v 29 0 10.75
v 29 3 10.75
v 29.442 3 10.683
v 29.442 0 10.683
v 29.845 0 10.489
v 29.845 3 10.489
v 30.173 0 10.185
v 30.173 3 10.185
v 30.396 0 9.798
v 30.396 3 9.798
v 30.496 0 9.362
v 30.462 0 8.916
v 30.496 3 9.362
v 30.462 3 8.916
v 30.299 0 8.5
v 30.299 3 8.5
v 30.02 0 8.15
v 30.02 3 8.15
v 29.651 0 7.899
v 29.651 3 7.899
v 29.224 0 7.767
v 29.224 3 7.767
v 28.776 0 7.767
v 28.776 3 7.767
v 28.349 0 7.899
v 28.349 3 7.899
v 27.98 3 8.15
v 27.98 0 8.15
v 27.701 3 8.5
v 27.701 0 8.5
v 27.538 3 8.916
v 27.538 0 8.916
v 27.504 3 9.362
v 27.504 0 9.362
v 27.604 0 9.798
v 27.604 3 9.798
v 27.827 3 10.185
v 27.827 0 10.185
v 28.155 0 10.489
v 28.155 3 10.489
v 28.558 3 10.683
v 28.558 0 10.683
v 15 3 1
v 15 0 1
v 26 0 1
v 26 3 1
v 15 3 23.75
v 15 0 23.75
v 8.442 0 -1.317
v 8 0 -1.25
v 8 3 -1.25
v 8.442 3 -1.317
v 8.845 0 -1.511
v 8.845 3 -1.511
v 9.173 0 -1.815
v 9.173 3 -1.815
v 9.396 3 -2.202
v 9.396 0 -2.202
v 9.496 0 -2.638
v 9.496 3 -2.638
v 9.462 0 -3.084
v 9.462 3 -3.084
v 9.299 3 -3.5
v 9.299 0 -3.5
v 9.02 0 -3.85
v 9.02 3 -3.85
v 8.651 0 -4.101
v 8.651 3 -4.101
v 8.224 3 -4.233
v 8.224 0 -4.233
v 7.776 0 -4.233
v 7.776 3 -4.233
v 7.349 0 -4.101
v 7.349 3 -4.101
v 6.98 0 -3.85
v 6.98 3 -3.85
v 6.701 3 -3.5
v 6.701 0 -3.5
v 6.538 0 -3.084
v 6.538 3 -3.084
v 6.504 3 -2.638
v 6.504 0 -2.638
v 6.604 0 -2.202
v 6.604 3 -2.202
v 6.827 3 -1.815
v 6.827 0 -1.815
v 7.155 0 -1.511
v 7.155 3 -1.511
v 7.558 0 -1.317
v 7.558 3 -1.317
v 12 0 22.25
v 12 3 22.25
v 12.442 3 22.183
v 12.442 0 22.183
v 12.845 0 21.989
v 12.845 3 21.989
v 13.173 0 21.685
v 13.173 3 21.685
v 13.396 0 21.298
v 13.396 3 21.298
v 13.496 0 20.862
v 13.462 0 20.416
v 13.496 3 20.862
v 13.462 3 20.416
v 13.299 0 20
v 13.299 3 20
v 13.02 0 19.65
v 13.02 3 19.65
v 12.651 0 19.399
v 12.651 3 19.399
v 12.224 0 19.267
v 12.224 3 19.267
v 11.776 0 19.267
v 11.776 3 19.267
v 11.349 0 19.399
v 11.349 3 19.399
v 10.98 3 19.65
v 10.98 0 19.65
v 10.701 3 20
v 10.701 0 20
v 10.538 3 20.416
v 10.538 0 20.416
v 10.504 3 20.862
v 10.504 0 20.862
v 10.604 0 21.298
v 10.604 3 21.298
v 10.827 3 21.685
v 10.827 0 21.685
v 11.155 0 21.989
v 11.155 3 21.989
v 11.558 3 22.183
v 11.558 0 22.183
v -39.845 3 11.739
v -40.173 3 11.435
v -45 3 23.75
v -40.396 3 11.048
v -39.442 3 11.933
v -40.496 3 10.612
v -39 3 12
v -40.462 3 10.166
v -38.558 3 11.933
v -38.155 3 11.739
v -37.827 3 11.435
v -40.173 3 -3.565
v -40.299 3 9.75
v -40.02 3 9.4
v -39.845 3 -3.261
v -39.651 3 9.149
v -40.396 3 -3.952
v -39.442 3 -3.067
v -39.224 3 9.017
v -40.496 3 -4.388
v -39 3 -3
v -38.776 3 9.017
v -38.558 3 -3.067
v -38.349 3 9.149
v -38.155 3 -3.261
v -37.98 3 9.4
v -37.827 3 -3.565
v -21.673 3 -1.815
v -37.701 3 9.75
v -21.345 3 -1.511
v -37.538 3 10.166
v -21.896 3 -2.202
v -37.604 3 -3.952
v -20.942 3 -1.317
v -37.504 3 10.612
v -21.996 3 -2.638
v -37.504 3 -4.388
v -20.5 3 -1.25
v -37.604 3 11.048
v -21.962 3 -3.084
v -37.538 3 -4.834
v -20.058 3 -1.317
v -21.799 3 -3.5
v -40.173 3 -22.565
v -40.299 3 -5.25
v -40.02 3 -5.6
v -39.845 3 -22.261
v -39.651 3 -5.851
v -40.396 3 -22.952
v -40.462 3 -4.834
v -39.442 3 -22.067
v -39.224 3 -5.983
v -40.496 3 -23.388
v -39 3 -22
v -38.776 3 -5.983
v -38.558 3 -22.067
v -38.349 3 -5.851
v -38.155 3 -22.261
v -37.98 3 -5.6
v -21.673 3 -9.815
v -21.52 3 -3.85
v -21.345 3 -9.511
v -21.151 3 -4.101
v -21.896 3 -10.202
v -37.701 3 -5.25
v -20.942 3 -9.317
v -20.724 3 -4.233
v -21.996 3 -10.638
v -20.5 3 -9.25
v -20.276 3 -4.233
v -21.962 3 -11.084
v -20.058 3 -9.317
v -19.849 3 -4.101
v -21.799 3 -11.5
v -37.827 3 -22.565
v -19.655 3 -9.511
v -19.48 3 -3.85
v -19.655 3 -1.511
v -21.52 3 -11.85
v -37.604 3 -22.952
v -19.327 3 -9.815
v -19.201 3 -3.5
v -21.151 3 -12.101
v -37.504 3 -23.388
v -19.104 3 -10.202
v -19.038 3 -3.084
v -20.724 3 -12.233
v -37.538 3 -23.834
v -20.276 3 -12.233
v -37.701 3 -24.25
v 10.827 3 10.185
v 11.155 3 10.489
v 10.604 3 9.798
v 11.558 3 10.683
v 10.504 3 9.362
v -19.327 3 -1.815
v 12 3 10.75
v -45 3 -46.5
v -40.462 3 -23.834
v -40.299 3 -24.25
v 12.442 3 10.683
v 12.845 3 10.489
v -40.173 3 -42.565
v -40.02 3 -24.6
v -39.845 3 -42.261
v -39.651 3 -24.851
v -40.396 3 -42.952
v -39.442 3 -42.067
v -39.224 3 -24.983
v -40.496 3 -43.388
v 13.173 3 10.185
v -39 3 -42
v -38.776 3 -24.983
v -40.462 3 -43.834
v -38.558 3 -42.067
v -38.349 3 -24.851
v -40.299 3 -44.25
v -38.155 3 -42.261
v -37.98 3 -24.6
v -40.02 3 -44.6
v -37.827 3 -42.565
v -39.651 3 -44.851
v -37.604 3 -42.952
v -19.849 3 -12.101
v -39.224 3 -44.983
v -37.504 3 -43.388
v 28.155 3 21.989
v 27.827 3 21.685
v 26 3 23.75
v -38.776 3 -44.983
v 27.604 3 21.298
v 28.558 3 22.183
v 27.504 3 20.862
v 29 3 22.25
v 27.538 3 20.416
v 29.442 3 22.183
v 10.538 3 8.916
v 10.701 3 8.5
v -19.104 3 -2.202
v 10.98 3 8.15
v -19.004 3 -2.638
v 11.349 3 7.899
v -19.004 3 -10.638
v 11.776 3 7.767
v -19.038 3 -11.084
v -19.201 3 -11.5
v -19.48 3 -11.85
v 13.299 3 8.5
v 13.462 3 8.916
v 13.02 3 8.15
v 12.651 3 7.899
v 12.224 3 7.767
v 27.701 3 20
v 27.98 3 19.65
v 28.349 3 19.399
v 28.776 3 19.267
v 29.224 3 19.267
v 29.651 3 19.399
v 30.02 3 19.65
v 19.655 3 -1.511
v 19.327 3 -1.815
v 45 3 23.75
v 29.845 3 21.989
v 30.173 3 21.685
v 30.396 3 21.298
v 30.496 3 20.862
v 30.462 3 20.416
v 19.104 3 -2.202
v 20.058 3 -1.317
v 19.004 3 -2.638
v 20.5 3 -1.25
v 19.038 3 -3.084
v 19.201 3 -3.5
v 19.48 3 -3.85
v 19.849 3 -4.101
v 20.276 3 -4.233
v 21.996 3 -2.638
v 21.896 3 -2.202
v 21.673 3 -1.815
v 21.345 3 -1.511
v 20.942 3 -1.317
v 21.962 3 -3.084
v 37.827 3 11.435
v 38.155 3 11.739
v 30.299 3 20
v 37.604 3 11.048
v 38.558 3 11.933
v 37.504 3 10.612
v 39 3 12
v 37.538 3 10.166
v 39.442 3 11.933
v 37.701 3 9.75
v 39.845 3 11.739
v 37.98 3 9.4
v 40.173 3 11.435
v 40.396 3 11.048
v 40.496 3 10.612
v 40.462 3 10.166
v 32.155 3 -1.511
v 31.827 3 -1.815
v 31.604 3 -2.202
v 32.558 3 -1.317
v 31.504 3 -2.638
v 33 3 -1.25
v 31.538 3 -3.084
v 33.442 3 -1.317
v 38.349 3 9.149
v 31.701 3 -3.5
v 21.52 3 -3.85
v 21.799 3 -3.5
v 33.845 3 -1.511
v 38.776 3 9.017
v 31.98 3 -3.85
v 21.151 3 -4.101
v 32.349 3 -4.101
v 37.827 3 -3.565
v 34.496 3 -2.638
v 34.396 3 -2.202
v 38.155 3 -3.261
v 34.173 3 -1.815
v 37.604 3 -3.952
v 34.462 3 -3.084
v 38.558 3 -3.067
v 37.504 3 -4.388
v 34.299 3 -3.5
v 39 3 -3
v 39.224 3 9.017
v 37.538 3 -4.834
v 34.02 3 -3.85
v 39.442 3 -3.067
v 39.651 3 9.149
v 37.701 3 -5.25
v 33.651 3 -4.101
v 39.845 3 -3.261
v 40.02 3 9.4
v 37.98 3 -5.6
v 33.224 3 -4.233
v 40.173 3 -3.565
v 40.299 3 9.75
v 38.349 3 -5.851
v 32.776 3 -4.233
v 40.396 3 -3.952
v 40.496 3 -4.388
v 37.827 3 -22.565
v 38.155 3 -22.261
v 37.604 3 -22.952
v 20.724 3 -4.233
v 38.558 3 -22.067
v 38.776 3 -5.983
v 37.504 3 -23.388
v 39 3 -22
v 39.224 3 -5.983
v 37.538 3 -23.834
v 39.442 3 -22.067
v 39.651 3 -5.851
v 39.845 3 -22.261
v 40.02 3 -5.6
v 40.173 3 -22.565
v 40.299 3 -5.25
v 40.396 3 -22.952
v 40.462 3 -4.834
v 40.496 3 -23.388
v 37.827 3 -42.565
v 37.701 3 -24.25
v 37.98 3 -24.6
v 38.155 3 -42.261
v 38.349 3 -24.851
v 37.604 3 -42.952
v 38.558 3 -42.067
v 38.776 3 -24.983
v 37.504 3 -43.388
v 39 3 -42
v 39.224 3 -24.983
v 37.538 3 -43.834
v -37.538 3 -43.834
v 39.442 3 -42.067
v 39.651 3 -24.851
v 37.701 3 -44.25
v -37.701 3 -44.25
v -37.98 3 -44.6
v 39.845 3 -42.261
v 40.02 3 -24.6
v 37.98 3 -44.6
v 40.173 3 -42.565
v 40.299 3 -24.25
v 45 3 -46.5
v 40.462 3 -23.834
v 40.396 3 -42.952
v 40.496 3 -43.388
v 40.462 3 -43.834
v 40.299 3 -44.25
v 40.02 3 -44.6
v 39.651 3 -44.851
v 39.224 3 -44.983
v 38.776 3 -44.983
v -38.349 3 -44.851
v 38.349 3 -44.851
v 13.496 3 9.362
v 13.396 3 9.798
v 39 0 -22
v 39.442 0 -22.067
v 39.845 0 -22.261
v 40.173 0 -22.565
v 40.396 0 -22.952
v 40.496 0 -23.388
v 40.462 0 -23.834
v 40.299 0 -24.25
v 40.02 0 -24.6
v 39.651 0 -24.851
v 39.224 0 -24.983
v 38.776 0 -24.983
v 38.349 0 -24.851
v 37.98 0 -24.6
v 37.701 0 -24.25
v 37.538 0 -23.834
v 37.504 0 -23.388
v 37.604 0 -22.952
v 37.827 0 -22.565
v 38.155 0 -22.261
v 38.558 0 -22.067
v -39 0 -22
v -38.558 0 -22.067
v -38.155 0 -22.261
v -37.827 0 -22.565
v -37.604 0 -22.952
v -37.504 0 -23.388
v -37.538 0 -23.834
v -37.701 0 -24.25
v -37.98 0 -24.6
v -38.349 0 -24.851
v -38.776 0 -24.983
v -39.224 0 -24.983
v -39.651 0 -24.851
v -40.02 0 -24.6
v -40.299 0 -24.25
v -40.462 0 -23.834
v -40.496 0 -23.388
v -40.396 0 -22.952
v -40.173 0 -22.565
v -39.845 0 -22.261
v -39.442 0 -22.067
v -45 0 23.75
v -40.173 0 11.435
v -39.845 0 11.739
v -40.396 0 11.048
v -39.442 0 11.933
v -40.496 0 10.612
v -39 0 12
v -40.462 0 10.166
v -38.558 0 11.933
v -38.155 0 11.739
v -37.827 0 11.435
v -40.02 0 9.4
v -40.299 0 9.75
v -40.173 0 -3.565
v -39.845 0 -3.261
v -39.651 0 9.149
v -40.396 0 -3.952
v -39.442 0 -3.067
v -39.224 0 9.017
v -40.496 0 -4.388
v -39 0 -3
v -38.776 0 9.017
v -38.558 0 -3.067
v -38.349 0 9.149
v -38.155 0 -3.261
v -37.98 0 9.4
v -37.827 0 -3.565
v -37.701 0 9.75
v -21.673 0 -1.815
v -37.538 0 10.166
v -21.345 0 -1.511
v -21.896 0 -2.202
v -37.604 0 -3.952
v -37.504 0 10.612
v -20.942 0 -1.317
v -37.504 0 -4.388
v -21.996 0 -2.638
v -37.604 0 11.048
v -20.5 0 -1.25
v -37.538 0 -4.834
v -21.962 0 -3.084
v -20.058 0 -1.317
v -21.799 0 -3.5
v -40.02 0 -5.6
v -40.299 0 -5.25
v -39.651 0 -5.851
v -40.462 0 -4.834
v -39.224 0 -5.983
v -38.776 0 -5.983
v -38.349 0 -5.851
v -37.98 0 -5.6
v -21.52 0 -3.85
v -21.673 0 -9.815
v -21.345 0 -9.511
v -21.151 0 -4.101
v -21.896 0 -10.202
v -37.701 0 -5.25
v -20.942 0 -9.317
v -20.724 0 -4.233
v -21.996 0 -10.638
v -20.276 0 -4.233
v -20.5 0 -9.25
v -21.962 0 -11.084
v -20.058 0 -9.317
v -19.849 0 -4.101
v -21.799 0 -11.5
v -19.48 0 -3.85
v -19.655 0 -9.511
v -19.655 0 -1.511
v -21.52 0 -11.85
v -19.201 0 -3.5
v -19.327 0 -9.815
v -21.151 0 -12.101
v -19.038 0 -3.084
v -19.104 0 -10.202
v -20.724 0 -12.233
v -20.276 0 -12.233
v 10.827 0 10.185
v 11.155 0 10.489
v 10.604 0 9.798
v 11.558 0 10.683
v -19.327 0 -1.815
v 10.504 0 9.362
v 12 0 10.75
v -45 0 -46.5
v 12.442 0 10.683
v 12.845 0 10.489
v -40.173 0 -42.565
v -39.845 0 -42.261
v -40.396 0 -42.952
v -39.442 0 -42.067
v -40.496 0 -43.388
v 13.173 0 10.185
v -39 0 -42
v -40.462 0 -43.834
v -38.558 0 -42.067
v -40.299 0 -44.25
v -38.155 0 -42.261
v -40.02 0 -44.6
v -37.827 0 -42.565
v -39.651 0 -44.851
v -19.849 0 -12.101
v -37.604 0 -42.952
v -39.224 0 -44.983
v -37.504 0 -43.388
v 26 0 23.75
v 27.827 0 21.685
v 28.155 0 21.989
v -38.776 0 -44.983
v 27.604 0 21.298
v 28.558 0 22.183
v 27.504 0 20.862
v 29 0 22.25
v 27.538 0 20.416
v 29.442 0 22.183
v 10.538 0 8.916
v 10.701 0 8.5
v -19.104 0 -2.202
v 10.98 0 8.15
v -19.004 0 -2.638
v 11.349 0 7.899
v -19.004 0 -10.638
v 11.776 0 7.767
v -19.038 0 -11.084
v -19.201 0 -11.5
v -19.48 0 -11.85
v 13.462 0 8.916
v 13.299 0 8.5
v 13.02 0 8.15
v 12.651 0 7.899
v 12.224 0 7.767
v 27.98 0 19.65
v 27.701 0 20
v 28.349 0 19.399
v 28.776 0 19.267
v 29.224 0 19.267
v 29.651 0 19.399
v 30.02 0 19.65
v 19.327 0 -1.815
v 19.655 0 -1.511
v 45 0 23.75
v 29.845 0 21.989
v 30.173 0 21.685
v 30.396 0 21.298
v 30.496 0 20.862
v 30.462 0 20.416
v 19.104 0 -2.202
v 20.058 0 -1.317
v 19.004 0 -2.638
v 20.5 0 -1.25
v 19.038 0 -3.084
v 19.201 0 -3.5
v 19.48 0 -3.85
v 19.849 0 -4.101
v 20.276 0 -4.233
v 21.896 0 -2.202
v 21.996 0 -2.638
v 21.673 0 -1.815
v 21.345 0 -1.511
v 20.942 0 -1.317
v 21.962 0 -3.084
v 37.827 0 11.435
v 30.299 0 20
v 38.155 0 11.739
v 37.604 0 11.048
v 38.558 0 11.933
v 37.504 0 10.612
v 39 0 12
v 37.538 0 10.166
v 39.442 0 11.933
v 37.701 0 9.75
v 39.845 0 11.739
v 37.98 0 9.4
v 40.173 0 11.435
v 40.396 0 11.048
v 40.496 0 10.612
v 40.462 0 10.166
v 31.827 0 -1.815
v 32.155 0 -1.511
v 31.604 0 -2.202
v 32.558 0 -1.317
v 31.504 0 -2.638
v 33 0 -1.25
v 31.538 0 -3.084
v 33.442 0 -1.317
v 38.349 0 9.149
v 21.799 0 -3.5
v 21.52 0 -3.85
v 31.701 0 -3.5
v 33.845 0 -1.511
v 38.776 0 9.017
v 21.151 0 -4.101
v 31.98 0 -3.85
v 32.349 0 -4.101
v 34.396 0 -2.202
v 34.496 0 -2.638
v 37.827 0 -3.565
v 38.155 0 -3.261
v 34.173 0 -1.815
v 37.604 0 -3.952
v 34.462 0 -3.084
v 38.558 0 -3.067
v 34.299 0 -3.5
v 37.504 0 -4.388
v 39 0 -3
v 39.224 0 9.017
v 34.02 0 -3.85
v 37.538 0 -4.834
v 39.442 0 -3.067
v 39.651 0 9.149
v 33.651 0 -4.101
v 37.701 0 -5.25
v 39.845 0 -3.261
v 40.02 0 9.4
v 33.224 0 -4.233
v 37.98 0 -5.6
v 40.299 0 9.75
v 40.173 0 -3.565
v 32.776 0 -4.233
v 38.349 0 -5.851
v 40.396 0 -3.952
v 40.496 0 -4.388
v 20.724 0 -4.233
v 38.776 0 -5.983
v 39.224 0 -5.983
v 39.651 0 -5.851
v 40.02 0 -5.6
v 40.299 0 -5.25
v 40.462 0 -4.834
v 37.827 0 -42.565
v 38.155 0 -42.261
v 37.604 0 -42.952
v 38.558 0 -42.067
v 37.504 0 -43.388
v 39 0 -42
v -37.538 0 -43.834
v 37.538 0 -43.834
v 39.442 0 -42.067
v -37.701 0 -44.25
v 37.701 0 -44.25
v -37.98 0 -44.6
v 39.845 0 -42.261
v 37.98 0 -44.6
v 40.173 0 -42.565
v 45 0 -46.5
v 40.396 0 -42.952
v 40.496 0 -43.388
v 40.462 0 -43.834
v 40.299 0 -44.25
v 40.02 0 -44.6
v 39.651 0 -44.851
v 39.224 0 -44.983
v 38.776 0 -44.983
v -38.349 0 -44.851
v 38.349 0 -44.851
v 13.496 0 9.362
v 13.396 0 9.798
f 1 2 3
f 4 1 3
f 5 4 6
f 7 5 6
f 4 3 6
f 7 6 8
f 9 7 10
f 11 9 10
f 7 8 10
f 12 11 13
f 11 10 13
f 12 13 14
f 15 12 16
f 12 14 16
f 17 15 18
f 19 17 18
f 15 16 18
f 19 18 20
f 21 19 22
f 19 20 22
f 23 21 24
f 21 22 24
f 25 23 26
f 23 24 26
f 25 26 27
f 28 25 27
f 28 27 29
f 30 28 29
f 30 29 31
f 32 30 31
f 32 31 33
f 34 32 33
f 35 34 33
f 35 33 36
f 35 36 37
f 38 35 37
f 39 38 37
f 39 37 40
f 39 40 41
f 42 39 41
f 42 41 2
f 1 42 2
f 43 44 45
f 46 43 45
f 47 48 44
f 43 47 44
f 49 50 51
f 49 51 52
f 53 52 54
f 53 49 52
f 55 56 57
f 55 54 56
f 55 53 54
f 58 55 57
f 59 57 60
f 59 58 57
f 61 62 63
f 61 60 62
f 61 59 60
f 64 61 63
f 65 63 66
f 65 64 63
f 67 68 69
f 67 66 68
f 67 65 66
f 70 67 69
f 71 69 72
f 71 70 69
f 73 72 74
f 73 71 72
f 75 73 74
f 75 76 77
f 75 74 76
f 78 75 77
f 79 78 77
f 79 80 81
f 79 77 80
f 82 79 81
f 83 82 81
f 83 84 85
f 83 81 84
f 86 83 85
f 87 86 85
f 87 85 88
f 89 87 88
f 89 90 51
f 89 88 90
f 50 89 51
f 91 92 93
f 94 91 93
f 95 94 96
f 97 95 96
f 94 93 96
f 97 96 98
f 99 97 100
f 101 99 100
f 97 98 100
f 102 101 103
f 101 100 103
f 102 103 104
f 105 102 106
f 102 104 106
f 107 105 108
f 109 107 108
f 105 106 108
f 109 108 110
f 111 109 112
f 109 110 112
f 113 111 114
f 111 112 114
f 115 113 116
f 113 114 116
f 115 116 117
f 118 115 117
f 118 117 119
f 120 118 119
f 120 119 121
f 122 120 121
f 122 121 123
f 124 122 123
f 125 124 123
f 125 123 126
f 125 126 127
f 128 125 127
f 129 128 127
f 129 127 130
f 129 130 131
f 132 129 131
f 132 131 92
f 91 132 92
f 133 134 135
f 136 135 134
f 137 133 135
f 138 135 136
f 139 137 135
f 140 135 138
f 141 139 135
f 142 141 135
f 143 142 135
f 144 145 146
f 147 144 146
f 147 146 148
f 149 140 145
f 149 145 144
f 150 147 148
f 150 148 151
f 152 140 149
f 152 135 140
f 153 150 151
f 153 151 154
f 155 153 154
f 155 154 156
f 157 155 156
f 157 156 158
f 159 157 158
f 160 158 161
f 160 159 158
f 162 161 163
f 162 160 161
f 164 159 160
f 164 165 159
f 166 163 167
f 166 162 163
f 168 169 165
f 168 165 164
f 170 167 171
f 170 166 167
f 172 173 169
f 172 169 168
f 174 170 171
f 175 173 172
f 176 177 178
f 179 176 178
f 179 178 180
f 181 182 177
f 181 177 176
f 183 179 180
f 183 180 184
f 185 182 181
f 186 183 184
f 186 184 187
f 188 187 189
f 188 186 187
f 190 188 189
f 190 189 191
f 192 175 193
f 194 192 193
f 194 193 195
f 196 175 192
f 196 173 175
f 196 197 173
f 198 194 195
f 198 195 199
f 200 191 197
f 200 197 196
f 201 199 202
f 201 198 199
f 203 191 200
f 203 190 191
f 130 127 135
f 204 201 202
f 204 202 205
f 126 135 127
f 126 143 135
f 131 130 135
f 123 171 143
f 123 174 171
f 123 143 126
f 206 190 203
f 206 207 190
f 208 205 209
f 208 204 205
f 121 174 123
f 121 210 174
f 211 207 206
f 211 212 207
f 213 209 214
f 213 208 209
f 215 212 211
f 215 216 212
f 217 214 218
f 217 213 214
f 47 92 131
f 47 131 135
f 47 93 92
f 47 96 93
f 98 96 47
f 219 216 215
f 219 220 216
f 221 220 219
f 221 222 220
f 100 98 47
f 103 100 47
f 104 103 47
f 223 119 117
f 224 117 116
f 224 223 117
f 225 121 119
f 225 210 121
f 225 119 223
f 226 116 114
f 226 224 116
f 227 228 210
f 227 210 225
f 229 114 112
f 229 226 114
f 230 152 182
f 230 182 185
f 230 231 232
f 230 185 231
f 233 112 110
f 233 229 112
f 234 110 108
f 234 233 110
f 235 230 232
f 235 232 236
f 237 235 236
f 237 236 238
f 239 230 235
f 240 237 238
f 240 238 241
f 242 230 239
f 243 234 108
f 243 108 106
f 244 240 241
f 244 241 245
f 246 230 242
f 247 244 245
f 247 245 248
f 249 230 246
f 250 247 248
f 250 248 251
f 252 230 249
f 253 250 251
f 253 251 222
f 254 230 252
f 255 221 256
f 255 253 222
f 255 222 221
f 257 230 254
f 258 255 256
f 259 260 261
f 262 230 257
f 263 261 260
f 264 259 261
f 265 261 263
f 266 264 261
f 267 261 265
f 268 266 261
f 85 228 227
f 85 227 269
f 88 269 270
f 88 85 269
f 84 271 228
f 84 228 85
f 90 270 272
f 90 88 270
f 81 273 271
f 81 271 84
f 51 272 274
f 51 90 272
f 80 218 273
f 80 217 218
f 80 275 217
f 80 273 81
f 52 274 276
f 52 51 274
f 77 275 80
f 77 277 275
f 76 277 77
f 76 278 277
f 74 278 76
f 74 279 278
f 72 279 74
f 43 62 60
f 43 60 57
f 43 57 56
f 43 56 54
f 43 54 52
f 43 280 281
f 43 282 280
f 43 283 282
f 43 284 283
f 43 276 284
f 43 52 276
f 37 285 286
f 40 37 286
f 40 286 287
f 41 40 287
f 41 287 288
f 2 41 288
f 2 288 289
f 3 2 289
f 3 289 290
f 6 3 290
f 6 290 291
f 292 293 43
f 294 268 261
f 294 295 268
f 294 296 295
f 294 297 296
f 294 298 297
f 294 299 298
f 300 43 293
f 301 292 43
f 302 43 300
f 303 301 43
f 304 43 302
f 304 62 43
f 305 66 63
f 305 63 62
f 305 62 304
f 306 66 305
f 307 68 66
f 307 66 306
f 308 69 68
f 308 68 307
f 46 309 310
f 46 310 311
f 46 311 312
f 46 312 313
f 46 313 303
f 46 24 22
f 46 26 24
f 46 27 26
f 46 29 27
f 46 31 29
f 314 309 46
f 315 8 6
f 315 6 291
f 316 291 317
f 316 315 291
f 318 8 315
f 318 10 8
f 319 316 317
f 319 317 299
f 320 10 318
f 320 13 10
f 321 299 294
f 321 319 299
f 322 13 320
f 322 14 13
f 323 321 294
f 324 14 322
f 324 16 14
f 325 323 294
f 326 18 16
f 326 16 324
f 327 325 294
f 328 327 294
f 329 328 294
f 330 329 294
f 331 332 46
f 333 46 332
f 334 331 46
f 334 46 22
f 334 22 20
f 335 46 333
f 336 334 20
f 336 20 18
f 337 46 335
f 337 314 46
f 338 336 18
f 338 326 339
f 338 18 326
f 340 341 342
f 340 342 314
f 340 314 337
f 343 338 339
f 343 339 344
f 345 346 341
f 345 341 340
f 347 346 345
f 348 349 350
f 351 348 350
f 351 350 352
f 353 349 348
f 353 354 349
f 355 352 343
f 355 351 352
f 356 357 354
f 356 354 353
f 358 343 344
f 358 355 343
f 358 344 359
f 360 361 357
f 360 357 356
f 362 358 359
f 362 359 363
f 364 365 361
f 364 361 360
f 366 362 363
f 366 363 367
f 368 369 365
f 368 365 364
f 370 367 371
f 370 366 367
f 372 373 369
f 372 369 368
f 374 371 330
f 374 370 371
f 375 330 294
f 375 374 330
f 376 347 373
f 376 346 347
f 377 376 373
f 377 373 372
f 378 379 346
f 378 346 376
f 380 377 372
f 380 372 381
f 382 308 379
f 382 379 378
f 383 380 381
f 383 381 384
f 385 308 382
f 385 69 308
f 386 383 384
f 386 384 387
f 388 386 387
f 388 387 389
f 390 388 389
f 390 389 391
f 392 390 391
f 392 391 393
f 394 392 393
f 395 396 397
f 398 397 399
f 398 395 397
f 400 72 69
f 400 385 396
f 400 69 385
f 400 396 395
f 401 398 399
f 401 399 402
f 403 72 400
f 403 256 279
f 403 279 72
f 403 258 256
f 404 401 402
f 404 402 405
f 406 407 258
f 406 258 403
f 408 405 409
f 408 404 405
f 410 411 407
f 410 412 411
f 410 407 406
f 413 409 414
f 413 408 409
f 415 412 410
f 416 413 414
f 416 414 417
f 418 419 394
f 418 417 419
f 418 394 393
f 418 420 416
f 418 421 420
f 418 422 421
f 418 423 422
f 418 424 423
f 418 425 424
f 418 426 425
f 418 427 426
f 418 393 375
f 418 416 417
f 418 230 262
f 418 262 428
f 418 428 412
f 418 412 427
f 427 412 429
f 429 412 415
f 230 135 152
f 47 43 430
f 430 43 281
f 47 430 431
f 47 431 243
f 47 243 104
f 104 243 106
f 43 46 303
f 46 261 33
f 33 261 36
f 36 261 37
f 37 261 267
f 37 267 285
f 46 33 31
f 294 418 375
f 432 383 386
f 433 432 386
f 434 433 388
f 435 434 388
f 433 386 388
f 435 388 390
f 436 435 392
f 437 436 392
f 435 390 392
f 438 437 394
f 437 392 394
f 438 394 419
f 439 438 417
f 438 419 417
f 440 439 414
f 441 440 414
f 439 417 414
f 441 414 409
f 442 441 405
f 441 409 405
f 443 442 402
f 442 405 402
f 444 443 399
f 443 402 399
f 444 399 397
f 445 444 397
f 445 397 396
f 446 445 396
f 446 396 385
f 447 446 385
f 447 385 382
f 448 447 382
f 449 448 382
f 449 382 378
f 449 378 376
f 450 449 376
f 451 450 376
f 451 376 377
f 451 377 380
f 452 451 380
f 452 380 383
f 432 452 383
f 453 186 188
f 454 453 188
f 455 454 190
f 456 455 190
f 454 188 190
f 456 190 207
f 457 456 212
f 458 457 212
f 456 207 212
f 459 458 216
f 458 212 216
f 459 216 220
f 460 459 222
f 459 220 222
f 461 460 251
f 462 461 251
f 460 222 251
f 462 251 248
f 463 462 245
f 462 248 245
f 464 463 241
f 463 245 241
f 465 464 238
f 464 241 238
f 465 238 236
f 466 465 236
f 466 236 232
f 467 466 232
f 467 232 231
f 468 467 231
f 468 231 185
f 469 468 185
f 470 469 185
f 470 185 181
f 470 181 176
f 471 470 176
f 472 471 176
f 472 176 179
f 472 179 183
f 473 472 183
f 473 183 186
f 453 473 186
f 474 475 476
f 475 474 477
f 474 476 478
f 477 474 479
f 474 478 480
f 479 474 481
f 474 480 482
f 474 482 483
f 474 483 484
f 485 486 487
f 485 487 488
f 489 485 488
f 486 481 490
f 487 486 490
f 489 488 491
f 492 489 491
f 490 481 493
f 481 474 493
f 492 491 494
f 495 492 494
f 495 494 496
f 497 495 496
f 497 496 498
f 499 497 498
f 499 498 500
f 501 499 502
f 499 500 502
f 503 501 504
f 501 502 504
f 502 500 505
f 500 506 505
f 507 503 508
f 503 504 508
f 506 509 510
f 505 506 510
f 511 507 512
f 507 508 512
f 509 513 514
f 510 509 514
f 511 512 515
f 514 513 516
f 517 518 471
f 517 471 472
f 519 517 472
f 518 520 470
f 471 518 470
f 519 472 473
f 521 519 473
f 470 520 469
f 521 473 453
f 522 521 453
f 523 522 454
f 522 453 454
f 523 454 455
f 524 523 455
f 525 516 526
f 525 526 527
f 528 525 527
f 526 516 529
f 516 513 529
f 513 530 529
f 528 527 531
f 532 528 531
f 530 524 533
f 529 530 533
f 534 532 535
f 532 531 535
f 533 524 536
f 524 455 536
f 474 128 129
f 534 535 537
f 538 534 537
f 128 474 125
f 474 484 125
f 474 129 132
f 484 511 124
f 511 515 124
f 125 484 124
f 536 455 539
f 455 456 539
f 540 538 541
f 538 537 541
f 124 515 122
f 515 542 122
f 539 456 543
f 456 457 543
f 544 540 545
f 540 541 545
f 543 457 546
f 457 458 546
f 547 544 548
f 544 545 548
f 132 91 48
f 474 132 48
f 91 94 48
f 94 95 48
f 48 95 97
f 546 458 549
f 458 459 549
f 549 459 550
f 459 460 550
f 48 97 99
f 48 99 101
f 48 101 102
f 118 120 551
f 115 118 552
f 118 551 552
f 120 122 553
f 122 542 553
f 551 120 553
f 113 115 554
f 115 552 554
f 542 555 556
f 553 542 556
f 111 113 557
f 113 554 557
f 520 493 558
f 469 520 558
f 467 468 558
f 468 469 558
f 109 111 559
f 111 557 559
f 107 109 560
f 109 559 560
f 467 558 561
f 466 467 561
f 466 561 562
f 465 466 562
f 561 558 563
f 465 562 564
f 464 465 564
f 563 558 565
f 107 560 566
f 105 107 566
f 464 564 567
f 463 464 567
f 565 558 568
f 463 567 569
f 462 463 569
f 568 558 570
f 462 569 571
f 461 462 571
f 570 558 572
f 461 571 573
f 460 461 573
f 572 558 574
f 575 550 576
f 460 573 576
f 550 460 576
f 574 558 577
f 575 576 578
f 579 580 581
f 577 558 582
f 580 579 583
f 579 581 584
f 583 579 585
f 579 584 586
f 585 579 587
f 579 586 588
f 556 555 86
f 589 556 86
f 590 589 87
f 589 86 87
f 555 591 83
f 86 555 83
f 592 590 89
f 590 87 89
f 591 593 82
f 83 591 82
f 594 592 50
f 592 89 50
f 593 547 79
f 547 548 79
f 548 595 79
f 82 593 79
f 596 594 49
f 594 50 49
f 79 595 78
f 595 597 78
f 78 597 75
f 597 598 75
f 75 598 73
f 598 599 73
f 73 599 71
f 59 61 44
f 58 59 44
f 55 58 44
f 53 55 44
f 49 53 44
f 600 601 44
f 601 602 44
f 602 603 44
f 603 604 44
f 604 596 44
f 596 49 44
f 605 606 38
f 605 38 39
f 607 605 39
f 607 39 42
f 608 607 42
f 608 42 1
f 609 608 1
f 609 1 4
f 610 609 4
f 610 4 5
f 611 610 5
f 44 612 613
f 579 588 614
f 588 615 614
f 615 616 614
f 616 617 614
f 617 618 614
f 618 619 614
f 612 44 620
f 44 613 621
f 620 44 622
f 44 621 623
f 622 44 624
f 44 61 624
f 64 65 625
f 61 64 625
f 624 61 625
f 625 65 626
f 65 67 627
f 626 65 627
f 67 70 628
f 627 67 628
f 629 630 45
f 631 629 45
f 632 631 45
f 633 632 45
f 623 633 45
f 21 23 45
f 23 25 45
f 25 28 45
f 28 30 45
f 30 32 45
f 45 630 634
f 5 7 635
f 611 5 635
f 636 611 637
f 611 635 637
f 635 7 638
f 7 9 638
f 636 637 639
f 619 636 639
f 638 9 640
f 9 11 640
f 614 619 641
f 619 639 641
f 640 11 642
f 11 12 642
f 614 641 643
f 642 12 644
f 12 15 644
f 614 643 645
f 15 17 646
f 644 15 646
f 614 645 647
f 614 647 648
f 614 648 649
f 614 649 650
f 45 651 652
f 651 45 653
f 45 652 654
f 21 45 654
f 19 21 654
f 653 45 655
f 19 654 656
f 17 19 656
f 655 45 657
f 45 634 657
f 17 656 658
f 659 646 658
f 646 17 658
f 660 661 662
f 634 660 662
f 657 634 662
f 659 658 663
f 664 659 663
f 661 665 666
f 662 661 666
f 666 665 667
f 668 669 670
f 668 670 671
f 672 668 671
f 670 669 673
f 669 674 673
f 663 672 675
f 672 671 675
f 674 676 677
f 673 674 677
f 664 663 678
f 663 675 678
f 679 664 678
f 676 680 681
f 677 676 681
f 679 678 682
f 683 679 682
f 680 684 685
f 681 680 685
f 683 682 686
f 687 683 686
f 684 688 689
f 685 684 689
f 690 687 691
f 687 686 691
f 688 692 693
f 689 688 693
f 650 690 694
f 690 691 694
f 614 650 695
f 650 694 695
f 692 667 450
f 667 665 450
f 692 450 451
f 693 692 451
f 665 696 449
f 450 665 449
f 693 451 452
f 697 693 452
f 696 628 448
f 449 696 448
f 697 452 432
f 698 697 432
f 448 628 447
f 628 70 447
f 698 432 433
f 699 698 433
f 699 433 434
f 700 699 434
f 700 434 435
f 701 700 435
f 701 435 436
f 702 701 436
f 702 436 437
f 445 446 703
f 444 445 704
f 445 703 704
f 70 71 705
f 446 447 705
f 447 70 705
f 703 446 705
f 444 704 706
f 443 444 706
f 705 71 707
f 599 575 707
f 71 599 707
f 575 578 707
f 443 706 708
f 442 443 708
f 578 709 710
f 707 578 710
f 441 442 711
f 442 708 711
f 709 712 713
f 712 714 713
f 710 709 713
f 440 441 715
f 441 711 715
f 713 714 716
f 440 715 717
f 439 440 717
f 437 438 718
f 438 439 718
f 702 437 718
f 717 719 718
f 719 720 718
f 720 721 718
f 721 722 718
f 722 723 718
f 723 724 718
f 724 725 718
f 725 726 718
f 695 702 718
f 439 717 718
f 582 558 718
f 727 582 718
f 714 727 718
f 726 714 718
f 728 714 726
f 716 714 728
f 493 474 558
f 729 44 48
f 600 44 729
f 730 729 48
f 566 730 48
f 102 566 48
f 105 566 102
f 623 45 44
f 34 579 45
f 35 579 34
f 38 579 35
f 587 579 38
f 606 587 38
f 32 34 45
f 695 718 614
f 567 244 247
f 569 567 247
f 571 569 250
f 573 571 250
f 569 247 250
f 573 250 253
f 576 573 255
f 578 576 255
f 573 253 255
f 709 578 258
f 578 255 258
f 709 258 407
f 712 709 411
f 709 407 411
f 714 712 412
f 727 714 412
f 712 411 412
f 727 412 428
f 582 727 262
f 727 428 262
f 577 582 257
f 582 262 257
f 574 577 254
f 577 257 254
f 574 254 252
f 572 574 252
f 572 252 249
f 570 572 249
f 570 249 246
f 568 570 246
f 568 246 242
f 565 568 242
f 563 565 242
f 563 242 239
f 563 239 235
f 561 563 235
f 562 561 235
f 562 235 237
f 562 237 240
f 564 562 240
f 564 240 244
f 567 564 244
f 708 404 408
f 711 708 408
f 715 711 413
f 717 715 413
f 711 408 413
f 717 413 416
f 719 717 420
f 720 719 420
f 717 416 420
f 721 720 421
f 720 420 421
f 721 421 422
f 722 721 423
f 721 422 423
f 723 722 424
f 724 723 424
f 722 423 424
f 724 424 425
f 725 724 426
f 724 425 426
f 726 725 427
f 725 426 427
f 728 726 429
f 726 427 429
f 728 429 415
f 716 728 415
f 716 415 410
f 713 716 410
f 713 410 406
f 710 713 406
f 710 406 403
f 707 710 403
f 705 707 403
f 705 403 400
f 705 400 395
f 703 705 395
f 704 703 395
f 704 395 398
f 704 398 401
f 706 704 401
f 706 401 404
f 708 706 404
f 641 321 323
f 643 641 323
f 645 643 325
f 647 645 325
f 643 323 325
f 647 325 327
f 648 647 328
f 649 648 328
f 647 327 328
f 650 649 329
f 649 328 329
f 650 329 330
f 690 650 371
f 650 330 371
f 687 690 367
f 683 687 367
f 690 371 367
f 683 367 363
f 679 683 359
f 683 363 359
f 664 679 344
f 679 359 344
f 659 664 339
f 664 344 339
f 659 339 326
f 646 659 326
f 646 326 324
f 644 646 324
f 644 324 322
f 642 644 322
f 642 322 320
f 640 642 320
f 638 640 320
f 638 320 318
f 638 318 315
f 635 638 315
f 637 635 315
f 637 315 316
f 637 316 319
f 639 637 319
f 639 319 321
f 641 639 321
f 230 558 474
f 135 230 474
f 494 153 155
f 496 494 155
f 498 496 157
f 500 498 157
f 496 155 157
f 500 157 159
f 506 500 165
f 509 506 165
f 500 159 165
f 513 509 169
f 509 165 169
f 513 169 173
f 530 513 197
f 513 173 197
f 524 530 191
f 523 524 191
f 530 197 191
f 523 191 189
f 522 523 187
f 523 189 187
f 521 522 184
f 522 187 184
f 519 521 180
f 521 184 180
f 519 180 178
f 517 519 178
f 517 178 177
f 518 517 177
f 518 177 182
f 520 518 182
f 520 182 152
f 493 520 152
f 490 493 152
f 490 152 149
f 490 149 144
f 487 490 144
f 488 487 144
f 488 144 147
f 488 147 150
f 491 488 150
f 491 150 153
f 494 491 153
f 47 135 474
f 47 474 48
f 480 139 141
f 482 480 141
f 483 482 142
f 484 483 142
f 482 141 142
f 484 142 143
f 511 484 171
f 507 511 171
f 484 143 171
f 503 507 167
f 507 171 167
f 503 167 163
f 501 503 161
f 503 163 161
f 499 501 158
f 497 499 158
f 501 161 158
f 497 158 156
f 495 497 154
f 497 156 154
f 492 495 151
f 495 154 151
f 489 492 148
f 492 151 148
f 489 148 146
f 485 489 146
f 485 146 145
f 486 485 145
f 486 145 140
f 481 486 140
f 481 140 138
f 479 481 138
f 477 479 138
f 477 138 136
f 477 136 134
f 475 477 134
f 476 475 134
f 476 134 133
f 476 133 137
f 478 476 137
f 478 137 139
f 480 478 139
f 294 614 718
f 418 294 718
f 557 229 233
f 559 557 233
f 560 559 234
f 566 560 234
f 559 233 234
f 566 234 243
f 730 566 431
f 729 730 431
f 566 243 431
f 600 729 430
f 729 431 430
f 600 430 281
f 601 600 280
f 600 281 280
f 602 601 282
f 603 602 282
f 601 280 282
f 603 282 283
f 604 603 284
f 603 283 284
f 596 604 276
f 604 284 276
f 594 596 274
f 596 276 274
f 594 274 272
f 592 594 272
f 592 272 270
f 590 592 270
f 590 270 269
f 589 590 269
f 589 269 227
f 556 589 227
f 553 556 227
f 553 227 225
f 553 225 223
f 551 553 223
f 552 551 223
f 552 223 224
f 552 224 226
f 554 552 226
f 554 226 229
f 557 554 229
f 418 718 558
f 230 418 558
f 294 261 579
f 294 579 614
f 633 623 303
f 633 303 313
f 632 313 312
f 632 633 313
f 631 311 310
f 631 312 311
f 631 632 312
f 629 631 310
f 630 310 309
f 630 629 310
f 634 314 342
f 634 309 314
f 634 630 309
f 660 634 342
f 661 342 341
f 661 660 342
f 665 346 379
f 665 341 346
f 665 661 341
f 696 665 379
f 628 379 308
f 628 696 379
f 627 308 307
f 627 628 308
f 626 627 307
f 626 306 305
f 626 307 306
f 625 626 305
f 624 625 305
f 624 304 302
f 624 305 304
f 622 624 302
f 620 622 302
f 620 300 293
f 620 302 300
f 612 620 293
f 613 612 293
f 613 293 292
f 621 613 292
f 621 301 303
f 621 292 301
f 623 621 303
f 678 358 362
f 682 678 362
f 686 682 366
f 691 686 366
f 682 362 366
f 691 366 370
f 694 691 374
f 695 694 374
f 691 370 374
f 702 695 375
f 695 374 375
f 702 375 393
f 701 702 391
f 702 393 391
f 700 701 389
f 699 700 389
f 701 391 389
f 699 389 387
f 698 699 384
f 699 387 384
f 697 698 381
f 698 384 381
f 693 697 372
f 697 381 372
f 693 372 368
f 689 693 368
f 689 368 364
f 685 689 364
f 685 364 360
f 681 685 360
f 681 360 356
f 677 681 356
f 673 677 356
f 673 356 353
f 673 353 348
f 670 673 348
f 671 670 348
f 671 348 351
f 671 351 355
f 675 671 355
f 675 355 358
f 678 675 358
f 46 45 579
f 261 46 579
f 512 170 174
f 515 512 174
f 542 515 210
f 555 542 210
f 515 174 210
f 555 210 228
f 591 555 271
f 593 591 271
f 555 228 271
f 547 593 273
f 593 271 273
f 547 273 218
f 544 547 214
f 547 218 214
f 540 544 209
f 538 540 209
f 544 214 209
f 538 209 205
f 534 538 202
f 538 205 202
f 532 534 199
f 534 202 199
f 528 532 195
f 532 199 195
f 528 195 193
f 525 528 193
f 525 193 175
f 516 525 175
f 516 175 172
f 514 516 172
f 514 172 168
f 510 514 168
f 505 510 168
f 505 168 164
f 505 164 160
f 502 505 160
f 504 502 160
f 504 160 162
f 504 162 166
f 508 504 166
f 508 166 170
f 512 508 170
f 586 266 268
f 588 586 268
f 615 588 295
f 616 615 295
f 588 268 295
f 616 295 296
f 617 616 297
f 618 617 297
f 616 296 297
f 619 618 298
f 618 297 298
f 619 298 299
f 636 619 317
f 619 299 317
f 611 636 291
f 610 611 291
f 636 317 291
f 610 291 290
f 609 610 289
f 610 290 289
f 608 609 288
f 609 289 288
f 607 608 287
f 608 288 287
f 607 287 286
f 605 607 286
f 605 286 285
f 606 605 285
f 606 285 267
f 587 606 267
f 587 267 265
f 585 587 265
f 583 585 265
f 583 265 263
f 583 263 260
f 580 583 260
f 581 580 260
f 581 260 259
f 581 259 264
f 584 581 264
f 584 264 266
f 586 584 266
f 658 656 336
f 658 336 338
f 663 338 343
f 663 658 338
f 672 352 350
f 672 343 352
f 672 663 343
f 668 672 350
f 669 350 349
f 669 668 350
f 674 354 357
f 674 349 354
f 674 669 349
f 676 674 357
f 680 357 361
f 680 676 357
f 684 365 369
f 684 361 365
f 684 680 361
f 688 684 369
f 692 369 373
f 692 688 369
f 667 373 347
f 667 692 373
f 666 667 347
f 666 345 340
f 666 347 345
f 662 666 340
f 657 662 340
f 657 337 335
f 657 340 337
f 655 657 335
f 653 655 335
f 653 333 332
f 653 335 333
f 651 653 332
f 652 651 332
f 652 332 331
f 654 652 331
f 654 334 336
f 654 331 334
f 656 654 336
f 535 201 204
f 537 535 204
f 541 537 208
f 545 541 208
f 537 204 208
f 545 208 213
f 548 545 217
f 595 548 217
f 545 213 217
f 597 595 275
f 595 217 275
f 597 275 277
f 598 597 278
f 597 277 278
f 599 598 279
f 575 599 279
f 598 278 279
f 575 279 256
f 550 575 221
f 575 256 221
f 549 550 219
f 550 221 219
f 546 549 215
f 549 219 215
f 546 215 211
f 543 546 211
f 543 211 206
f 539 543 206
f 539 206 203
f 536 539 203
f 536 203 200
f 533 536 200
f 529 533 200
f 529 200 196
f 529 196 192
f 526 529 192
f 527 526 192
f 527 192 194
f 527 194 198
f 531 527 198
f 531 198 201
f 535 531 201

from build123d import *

# Parameters (mm, degrees)
BOSS_EXTRUDE1_DEPTH     = 3
SKETCH2_R               = 1.5
CUT_EXTRUDE1_DEPTH      = 65.778468645
SKETCH3_R               = 1.5
CUT_EXTRUDE2_DEPTH      = 65.778468645
SKETCH4_R               = 1.5
CUT_EXTRUDE3_DEPTH      = 65.778468645
SKETCH5_W               = 90
SKETCH5_H               = 22.75
CUT_EXTRUDE4_DEPTH      = 65.778468645
CUT_EXTRUDE5_DEPTH      = 65.778468645
CUT_EXTRUDE5_DEPTH_BACK = 65.778468645
SKETCH6_R               = 1.5
SKETCH7_R               = 1.5
CUT_EXTRUDE6_DEPTH      = 65.778468645
SKETCH8_R               = 1.5
CUT_EXTRUDE7_DEPTH      = 65.778468645
SKETCH9_R               = 1.5
CUT_EXTRUDE8_DEPTH      = 65.778468645


with BuildPart() as part:
    # Sketch1 → Boss-Extrude1 (new body)
    with BuildSketch(Plane(origin=(0, 0, 0), x_dir=(1, 0, 0), z_dir=(0, 1, 0))):
        Polygon((-45, 46.5), (-45, -46.5), (15, -46.5), (15, -1), (26, -1), (26, -46.5), (45, -46.5), (45, 46.5), align=None)
    extrude(amount=BOSS_EXTRUDE1_DEPTH)

    # Sketch2 → Cut-Extrude1 (cut, through all)
    with BuildSketch(Plane(origin=(0, 3, 0), x_dir=(1, 0, 0), z_dir=(0, 1, 0))):
        with Locations(Location((39, 4.5, 0), (0, 0, 270))):
            Circle(SKETCH2_R)
        with Locations(Location((39, -10.5, 0), (0, 0, 270))):
            Circle(SKETCH2_R)
        with Locations(Location((-39, 4.5, 0), (0, 0, 270))):
            Circle(SKETCH2_R)
        with Locations(Location((-39, -10.5, 0), (0, 0, 270))):
            Circle(SKETCH2_R)
    extrude(amount=-CUT_EXTRUDE1_DEPTH, mode=Mode.SUBTRACT)

    # Sketch3 → Cut-Extrude2 (cut, through all)
    with BuildSketch(Plane(origin=(0, 3, 0), x_dir=(1, 0, 0), z_dir=(0, 1, 0))):
        with Locations(Location((29, -20.75, 0), (0, 0, 270))):
            Circle(SKETCH3_R)
        with Locations(Location((12, -20.75, 0), (0, 0, 270))):
            Circle(SKETCH3_R)
    extrude(amount=-CUT_EXTRUDE2_DEPTH, mode=Mode.SUBTRACT)

    # Sketch4 → Cut-Extrude3 (cut, through all)
    with BuildSketch(Plane(origin=(0, 3, 0), x_dir=(1, 0, 0), z_dir=(0, 1, 0))):
        with Locations(Location((12, -9.25, 0), (0, 0, 270))):
            Circle(SKETCH4_R)
        with Locations(Location((29, -9.25, 0), (0, 0, 270))):
            Circle(SKETCH4_R)
    extrude(amount=-CUT_EXTRUDE3_DEPTH, mode=Mode.SUBTRACT)

    # Sketch5 → Cut-Extrude4 (cut, through all)
    with BuildSketch(Plane(origin=(0, 3, 0), x_dir=(1, 0, 0), z_dir=(0, 1, 0))):
        with Locations((0, -35.125)):
            Rectangle(SKETCH5_W, SKETCH5_H)
    extrude(amount=-CUT_EXTRUDE4_DEPTH, mode=Mode.SUBTRACT)

    # Sketch6 → Cut-Extrude5 (cut, two sides: drawn at the far end of the back side and taken through both)
    with BuildSketch(Plane(origin=(0, 3, 0), x_dir=(1, 0, 0), z_dir=(0, 1, 0)).offset(-CUT_EXTRUDE5_DEPTH_BACK)):
        with Locations(Location((20.5, 2.75, 0), (0, 0, 270))):
            Circle(SKETCH6_R)
        with Locations(Location((33, 2.75, 0), (0, 0, 270))):
            Circle(SKETCH6_R)
        with Locations(Location((8, 2.75, 0), (0, 0, 270))):
            Circle(SKETCH6_R)
    extrude(amount=CUT_EXTRUDE5_DEPTH + CUT_EXTRUDE5_DEPTH_BACK, mode=Mode.SUBTRACT)

    # Sketch7 → Cut-Extrude6 (cut, through all)
    with BuildSketch(Plane(origin=(0, 3, 0), x_dir=(1, 0, 0), z_dir=(0, 1, 0))):
        with Locations(Location((-39, 23.5, 0), (0, 0, 270))):
            Circle(SKETCH7_R)
        with Locations(Location((39, 23.5, 0), (0, 0, 270))):
            Circle(SKETCH7_R)
    extrude(amount=-CUT_EXTRUDE6_DEPTH, mode=Mode.SUBTRACT)

    # Sketch8 → Cut-Extrude7 (cut, through all)
    with BuildSketch(Plane(origin=(0, 3, 0), x_dir=(1, 0, 0), z_dir=(0, 1, 0))):
        with Locations(Location((-39, 43.5, 0), (0, 0, 270))):
            Circle(SKETCH8_R)
        with Locations(Location((39, 43.5, 0), (0, 0, 270))):
            Circle(SKETCH8_R)
    extrude(amount=-CUT_EXTRUDE7_DEPTH, mode=Mode.SUBTRACT)

    # Sketch9 → Cut-Extrude8 (cut, through all)
    with BuildSketch(Plane(origin=(0, 3, 0), x_dir=(1, 0, 0), z_dir=(0, 1, 0))):
        with Locations(Location((-20.5, 2.75, 0), (0, 0, 270))):
            Circle(SKETCH9_R)
        with Locations(Location((-20.5, 10.75, 0), (0, 0, 270))):
            Circle(SKETCH9_R)
    extrude(amount=-CUT_EXTRUDE8_DEPTH, mode=Mode.SUBTRACT)


solid = part.part
